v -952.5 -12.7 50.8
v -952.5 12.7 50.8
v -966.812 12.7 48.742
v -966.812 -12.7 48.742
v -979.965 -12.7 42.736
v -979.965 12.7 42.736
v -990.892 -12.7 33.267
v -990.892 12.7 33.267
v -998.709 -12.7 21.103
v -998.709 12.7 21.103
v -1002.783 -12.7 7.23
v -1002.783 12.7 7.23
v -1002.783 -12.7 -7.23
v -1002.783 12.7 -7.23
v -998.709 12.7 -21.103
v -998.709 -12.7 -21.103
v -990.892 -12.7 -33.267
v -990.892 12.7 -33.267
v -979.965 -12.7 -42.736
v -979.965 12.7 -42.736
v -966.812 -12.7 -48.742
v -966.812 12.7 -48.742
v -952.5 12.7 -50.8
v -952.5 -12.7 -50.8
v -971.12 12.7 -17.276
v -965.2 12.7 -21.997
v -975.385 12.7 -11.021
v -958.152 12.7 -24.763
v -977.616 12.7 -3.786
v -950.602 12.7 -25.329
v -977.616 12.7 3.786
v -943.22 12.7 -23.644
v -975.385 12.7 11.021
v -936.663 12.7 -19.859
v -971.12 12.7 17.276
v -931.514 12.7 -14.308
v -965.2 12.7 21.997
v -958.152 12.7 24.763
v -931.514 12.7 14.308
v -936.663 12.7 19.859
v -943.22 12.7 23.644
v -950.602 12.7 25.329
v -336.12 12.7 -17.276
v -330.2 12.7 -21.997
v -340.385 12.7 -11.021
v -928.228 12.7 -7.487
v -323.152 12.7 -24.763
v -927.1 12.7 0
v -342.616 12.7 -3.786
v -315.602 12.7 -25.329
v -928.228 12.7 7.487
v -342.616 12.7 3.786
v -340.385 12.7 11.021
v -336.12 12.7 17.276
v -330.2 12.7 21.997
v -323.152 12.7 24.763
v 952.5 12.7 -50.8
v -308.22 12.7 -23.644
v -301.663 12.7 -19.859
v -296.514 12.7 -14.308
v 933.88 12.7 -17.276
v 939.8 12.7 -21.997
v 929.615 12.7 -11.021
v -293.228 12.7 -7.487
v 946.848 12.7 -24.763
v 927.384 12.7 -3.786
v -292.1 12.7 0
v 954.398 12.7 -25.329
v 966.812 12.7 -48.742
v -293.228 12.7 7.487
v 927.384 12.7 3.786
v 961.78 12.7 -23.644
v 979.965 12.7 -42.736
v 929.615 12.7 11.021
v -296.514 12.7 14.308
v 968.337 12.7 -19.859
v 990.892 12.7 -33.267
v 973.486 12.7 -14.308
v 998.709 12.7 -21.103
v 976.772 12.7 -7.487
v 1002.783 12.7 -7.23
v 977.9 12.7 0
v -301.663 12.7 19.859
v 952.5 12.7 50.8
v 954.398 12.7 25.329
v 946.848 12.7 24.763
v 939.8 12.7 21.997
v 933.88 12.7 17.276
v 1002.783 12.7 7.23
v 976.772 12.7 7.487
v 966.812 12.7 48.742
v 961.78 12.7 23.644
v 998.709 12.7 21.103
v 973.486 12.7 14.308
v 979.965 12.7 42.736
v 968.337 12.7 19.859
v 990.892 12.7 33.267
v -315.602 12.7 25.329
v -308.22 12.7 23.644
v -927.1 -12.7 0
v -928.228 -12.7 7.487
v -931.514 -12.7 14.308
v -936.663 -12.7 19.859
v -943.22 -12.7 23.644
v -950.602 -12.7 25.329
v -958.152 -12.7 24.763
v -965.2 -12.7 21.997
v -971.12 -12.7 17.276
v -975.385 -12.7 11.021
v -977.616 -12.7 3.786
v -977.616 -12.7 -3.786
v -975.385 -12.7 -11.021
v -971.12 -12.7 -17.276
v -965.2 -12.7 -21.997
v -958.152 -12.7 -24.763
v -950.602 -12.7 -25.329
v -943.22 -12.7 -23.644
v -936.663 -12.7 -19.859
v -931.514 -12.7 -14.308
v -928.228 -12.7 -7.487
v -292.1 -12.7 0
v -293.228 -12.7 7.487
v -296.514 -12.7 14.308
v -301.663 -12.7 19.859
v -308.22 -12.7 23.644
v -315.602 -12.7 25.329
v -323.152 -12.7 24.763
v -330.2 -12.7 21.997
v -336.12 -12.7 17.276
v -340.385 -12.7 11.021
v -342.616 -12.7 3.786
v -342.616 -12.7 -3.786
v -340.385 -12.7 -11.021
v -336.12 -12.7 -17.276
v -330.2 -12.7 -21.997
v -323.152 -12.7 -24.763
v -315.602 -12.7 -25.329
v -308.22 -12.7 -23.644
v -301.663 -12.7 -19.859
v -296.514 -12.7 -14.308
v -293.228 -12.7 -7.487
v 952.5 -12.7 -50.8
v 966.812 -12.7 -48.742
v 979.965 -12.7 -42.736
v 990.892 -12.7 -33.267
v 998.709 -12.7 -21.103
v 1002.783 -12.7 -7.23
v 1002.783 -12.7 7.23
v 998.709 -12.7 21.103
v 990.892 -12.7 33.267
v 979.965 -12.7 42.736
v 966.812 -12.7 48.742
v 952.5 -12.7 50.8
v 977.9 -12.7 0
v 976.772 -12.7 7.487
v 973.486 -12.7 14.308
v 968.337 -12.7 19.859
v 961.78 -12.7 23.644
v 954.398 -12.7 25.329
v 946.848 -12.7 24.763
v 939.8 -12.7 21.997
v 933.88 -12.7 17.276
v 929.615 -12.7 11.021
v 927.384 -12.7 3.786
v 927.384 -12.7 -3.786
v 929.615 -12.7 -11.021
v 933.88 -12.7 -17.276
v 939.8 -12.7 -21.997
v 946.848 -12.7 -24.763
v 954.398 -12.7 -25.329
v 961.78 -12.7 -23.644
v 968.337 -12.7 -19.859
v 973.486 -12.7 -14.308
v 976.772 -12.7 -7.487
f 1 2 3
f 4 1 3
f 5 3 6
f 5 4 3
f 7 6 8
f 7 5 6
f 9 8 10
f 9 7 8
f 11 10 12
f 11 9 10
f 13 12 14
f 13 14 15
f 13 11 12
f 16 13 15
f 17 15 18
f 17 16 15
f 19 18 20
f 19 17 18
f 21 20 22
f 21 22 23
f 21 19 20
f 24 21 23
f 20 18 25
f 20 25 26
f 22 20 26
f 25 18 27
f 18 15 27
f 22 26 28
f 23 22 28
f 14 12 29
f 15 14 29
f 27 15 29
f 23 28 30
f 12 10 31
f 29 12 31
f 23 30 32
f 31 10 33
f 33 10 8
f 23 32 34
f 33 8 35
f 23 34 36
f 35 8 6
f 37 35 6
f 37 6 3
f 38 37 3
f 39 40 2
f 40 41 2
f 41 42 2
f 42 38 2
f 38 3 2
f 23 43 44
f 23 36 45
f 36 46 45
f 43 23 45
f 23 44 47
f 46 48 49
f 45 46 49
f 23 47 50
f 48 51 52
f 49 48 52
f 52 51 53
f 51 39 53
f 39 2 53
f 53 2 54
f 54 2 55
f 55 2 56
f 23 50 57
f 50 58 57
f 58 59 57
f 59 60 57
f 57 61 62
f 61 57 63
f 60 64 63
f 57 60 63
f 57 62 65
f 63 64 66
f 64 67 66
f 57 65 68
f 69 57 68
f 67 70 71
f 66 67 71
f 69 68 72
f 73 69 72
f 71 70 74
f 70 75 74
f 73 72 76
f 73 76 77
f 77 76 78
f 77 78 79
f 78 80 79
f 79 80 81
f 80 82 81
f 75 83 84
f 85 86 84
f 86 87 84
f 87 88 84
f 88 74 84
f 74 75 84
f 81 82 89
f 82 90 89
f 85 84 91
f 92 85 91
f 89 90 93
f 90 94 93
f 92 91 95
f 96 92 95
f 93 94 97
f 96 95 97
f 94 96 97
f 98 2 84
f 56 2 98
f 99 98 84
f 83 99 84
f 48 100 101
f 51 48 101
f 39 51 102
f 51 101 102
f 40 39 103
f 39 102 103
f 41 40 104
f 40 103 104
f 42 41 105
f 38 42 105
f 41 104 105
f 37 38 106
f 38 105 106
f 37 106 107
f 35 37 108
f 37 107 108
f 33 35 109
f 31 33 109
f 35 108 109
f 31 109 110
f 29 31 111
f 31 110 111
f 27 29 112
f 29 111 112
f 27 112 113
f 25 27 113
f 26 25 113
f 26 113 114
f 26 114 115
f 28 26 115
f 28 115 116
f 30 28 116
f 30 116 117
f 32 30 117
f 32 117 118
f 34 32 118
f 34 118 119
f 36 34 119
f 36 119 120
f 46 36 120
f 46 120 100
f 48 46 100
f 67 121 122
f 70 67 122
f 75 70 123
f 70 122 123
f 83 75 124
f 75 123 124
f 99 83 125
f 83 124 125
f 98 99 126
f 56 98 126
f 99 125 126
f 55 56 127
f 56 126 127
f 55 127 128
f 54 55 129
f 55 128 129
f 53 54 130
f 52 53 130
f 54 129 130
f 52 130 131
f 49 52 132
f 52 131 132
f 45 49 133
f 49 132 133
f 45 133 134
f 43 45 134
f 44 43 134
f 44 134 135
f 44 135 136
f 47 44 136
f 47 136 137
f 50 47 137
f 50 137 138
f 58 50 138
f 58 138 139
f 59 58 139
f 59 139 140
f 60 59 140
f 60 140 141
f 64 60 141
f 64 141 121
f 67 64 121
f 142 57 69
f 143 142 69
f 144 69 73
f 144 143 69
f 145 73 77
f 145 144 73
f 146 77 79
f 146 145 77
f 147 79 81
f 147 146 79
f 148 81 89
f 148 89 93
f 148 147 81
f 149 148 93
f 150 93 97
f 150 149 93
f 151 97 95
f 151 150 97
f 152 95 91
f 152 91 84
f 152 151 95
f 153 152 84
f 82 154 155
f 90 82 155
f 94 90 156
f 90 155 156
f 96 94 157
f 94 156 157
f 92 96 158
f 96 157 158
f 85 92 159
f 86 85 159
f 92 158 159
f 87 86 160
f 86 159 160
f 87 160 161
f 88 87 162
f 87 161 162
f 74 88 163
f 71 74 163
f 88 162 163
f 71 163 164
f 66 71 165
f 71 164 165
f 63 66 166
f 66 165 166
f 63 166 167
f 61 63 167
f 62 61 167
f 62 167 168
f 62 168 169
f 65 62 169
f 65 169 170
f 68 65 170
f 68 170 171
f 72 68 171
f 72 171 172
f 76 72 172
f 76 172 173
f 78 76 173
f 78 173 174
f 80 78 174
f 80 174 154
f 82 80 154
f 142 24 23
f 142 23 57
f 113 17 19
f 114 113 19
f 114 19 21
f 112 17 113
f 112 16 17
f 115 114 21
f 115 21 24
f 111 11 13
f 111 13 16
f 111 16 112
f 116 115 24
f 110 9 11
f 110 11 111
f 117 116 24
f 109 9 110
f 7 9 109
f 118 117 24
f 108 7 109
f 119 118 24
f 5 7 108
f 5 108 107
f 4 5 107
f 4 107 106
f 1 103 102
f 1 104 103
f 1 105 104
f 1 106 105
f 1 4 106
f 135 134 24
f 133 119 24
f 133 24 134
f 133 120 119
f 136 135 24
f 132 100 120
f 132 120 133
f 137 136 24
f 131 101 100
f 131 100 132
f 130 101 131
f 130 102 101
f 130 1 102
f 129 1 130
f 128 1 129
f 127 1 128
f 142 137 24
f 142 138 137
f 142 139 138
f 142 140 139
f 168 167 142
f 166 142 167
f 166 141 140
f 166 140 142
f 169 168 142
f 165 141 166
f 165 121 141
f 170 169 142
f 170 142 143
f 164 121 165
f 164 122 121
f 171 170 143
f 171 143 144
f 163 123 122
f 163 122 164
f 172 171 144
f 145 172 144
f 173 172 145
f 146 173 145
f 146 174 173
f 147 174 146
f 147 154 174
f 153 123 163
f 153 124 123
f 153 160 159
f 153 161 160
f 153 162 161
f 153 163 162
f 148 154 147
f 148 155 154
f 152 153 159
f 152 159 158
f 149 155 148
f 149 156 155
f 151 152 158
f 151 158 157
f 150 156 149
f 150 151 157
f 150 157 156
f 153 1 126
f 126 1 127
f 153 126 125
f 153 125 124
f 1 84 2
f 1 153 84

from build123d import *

# Parameters (mm, degrees)
F1_DEPTH = 12.7
F2_R     = 25.4
F3_DEPTH = 25.401


with BuildPart() as f1:
    # F0 (on Front) → F1 (new body, symmetric)
    with BuildSketch(Plane.XZ):
        with BuildLine():
            Line((952.5, 50.8), (-952.5, 50.8))
            ThreePointArc((-952.5, 50.8), (-1003.3, 0), (-952.5, -50.8))
            Line((-952.5, -50.8), (952.5, -50.8))
            ThreePointArc((952.5, -50.8), (1003.3, 0), (952.5, 50.8))
        make_face()
    extrude(amount=F1_DEPTH, both=True)

    # F2 (on face) → F3 (cut, through all)
    with BuildSketch(Plane.XZ.offset(12.7)):
        with Locations((-952.5, 0)):
            Circle(F2_R)
        with Locations((952.5, 0)):
            Circle(F2_R)
        with Locations((-317.5, 0)):
            Circle(F2_R)
    extrude(amount=-F3_DEPTH, mode=Mode.SUBTRACT)


solid = f1.part
